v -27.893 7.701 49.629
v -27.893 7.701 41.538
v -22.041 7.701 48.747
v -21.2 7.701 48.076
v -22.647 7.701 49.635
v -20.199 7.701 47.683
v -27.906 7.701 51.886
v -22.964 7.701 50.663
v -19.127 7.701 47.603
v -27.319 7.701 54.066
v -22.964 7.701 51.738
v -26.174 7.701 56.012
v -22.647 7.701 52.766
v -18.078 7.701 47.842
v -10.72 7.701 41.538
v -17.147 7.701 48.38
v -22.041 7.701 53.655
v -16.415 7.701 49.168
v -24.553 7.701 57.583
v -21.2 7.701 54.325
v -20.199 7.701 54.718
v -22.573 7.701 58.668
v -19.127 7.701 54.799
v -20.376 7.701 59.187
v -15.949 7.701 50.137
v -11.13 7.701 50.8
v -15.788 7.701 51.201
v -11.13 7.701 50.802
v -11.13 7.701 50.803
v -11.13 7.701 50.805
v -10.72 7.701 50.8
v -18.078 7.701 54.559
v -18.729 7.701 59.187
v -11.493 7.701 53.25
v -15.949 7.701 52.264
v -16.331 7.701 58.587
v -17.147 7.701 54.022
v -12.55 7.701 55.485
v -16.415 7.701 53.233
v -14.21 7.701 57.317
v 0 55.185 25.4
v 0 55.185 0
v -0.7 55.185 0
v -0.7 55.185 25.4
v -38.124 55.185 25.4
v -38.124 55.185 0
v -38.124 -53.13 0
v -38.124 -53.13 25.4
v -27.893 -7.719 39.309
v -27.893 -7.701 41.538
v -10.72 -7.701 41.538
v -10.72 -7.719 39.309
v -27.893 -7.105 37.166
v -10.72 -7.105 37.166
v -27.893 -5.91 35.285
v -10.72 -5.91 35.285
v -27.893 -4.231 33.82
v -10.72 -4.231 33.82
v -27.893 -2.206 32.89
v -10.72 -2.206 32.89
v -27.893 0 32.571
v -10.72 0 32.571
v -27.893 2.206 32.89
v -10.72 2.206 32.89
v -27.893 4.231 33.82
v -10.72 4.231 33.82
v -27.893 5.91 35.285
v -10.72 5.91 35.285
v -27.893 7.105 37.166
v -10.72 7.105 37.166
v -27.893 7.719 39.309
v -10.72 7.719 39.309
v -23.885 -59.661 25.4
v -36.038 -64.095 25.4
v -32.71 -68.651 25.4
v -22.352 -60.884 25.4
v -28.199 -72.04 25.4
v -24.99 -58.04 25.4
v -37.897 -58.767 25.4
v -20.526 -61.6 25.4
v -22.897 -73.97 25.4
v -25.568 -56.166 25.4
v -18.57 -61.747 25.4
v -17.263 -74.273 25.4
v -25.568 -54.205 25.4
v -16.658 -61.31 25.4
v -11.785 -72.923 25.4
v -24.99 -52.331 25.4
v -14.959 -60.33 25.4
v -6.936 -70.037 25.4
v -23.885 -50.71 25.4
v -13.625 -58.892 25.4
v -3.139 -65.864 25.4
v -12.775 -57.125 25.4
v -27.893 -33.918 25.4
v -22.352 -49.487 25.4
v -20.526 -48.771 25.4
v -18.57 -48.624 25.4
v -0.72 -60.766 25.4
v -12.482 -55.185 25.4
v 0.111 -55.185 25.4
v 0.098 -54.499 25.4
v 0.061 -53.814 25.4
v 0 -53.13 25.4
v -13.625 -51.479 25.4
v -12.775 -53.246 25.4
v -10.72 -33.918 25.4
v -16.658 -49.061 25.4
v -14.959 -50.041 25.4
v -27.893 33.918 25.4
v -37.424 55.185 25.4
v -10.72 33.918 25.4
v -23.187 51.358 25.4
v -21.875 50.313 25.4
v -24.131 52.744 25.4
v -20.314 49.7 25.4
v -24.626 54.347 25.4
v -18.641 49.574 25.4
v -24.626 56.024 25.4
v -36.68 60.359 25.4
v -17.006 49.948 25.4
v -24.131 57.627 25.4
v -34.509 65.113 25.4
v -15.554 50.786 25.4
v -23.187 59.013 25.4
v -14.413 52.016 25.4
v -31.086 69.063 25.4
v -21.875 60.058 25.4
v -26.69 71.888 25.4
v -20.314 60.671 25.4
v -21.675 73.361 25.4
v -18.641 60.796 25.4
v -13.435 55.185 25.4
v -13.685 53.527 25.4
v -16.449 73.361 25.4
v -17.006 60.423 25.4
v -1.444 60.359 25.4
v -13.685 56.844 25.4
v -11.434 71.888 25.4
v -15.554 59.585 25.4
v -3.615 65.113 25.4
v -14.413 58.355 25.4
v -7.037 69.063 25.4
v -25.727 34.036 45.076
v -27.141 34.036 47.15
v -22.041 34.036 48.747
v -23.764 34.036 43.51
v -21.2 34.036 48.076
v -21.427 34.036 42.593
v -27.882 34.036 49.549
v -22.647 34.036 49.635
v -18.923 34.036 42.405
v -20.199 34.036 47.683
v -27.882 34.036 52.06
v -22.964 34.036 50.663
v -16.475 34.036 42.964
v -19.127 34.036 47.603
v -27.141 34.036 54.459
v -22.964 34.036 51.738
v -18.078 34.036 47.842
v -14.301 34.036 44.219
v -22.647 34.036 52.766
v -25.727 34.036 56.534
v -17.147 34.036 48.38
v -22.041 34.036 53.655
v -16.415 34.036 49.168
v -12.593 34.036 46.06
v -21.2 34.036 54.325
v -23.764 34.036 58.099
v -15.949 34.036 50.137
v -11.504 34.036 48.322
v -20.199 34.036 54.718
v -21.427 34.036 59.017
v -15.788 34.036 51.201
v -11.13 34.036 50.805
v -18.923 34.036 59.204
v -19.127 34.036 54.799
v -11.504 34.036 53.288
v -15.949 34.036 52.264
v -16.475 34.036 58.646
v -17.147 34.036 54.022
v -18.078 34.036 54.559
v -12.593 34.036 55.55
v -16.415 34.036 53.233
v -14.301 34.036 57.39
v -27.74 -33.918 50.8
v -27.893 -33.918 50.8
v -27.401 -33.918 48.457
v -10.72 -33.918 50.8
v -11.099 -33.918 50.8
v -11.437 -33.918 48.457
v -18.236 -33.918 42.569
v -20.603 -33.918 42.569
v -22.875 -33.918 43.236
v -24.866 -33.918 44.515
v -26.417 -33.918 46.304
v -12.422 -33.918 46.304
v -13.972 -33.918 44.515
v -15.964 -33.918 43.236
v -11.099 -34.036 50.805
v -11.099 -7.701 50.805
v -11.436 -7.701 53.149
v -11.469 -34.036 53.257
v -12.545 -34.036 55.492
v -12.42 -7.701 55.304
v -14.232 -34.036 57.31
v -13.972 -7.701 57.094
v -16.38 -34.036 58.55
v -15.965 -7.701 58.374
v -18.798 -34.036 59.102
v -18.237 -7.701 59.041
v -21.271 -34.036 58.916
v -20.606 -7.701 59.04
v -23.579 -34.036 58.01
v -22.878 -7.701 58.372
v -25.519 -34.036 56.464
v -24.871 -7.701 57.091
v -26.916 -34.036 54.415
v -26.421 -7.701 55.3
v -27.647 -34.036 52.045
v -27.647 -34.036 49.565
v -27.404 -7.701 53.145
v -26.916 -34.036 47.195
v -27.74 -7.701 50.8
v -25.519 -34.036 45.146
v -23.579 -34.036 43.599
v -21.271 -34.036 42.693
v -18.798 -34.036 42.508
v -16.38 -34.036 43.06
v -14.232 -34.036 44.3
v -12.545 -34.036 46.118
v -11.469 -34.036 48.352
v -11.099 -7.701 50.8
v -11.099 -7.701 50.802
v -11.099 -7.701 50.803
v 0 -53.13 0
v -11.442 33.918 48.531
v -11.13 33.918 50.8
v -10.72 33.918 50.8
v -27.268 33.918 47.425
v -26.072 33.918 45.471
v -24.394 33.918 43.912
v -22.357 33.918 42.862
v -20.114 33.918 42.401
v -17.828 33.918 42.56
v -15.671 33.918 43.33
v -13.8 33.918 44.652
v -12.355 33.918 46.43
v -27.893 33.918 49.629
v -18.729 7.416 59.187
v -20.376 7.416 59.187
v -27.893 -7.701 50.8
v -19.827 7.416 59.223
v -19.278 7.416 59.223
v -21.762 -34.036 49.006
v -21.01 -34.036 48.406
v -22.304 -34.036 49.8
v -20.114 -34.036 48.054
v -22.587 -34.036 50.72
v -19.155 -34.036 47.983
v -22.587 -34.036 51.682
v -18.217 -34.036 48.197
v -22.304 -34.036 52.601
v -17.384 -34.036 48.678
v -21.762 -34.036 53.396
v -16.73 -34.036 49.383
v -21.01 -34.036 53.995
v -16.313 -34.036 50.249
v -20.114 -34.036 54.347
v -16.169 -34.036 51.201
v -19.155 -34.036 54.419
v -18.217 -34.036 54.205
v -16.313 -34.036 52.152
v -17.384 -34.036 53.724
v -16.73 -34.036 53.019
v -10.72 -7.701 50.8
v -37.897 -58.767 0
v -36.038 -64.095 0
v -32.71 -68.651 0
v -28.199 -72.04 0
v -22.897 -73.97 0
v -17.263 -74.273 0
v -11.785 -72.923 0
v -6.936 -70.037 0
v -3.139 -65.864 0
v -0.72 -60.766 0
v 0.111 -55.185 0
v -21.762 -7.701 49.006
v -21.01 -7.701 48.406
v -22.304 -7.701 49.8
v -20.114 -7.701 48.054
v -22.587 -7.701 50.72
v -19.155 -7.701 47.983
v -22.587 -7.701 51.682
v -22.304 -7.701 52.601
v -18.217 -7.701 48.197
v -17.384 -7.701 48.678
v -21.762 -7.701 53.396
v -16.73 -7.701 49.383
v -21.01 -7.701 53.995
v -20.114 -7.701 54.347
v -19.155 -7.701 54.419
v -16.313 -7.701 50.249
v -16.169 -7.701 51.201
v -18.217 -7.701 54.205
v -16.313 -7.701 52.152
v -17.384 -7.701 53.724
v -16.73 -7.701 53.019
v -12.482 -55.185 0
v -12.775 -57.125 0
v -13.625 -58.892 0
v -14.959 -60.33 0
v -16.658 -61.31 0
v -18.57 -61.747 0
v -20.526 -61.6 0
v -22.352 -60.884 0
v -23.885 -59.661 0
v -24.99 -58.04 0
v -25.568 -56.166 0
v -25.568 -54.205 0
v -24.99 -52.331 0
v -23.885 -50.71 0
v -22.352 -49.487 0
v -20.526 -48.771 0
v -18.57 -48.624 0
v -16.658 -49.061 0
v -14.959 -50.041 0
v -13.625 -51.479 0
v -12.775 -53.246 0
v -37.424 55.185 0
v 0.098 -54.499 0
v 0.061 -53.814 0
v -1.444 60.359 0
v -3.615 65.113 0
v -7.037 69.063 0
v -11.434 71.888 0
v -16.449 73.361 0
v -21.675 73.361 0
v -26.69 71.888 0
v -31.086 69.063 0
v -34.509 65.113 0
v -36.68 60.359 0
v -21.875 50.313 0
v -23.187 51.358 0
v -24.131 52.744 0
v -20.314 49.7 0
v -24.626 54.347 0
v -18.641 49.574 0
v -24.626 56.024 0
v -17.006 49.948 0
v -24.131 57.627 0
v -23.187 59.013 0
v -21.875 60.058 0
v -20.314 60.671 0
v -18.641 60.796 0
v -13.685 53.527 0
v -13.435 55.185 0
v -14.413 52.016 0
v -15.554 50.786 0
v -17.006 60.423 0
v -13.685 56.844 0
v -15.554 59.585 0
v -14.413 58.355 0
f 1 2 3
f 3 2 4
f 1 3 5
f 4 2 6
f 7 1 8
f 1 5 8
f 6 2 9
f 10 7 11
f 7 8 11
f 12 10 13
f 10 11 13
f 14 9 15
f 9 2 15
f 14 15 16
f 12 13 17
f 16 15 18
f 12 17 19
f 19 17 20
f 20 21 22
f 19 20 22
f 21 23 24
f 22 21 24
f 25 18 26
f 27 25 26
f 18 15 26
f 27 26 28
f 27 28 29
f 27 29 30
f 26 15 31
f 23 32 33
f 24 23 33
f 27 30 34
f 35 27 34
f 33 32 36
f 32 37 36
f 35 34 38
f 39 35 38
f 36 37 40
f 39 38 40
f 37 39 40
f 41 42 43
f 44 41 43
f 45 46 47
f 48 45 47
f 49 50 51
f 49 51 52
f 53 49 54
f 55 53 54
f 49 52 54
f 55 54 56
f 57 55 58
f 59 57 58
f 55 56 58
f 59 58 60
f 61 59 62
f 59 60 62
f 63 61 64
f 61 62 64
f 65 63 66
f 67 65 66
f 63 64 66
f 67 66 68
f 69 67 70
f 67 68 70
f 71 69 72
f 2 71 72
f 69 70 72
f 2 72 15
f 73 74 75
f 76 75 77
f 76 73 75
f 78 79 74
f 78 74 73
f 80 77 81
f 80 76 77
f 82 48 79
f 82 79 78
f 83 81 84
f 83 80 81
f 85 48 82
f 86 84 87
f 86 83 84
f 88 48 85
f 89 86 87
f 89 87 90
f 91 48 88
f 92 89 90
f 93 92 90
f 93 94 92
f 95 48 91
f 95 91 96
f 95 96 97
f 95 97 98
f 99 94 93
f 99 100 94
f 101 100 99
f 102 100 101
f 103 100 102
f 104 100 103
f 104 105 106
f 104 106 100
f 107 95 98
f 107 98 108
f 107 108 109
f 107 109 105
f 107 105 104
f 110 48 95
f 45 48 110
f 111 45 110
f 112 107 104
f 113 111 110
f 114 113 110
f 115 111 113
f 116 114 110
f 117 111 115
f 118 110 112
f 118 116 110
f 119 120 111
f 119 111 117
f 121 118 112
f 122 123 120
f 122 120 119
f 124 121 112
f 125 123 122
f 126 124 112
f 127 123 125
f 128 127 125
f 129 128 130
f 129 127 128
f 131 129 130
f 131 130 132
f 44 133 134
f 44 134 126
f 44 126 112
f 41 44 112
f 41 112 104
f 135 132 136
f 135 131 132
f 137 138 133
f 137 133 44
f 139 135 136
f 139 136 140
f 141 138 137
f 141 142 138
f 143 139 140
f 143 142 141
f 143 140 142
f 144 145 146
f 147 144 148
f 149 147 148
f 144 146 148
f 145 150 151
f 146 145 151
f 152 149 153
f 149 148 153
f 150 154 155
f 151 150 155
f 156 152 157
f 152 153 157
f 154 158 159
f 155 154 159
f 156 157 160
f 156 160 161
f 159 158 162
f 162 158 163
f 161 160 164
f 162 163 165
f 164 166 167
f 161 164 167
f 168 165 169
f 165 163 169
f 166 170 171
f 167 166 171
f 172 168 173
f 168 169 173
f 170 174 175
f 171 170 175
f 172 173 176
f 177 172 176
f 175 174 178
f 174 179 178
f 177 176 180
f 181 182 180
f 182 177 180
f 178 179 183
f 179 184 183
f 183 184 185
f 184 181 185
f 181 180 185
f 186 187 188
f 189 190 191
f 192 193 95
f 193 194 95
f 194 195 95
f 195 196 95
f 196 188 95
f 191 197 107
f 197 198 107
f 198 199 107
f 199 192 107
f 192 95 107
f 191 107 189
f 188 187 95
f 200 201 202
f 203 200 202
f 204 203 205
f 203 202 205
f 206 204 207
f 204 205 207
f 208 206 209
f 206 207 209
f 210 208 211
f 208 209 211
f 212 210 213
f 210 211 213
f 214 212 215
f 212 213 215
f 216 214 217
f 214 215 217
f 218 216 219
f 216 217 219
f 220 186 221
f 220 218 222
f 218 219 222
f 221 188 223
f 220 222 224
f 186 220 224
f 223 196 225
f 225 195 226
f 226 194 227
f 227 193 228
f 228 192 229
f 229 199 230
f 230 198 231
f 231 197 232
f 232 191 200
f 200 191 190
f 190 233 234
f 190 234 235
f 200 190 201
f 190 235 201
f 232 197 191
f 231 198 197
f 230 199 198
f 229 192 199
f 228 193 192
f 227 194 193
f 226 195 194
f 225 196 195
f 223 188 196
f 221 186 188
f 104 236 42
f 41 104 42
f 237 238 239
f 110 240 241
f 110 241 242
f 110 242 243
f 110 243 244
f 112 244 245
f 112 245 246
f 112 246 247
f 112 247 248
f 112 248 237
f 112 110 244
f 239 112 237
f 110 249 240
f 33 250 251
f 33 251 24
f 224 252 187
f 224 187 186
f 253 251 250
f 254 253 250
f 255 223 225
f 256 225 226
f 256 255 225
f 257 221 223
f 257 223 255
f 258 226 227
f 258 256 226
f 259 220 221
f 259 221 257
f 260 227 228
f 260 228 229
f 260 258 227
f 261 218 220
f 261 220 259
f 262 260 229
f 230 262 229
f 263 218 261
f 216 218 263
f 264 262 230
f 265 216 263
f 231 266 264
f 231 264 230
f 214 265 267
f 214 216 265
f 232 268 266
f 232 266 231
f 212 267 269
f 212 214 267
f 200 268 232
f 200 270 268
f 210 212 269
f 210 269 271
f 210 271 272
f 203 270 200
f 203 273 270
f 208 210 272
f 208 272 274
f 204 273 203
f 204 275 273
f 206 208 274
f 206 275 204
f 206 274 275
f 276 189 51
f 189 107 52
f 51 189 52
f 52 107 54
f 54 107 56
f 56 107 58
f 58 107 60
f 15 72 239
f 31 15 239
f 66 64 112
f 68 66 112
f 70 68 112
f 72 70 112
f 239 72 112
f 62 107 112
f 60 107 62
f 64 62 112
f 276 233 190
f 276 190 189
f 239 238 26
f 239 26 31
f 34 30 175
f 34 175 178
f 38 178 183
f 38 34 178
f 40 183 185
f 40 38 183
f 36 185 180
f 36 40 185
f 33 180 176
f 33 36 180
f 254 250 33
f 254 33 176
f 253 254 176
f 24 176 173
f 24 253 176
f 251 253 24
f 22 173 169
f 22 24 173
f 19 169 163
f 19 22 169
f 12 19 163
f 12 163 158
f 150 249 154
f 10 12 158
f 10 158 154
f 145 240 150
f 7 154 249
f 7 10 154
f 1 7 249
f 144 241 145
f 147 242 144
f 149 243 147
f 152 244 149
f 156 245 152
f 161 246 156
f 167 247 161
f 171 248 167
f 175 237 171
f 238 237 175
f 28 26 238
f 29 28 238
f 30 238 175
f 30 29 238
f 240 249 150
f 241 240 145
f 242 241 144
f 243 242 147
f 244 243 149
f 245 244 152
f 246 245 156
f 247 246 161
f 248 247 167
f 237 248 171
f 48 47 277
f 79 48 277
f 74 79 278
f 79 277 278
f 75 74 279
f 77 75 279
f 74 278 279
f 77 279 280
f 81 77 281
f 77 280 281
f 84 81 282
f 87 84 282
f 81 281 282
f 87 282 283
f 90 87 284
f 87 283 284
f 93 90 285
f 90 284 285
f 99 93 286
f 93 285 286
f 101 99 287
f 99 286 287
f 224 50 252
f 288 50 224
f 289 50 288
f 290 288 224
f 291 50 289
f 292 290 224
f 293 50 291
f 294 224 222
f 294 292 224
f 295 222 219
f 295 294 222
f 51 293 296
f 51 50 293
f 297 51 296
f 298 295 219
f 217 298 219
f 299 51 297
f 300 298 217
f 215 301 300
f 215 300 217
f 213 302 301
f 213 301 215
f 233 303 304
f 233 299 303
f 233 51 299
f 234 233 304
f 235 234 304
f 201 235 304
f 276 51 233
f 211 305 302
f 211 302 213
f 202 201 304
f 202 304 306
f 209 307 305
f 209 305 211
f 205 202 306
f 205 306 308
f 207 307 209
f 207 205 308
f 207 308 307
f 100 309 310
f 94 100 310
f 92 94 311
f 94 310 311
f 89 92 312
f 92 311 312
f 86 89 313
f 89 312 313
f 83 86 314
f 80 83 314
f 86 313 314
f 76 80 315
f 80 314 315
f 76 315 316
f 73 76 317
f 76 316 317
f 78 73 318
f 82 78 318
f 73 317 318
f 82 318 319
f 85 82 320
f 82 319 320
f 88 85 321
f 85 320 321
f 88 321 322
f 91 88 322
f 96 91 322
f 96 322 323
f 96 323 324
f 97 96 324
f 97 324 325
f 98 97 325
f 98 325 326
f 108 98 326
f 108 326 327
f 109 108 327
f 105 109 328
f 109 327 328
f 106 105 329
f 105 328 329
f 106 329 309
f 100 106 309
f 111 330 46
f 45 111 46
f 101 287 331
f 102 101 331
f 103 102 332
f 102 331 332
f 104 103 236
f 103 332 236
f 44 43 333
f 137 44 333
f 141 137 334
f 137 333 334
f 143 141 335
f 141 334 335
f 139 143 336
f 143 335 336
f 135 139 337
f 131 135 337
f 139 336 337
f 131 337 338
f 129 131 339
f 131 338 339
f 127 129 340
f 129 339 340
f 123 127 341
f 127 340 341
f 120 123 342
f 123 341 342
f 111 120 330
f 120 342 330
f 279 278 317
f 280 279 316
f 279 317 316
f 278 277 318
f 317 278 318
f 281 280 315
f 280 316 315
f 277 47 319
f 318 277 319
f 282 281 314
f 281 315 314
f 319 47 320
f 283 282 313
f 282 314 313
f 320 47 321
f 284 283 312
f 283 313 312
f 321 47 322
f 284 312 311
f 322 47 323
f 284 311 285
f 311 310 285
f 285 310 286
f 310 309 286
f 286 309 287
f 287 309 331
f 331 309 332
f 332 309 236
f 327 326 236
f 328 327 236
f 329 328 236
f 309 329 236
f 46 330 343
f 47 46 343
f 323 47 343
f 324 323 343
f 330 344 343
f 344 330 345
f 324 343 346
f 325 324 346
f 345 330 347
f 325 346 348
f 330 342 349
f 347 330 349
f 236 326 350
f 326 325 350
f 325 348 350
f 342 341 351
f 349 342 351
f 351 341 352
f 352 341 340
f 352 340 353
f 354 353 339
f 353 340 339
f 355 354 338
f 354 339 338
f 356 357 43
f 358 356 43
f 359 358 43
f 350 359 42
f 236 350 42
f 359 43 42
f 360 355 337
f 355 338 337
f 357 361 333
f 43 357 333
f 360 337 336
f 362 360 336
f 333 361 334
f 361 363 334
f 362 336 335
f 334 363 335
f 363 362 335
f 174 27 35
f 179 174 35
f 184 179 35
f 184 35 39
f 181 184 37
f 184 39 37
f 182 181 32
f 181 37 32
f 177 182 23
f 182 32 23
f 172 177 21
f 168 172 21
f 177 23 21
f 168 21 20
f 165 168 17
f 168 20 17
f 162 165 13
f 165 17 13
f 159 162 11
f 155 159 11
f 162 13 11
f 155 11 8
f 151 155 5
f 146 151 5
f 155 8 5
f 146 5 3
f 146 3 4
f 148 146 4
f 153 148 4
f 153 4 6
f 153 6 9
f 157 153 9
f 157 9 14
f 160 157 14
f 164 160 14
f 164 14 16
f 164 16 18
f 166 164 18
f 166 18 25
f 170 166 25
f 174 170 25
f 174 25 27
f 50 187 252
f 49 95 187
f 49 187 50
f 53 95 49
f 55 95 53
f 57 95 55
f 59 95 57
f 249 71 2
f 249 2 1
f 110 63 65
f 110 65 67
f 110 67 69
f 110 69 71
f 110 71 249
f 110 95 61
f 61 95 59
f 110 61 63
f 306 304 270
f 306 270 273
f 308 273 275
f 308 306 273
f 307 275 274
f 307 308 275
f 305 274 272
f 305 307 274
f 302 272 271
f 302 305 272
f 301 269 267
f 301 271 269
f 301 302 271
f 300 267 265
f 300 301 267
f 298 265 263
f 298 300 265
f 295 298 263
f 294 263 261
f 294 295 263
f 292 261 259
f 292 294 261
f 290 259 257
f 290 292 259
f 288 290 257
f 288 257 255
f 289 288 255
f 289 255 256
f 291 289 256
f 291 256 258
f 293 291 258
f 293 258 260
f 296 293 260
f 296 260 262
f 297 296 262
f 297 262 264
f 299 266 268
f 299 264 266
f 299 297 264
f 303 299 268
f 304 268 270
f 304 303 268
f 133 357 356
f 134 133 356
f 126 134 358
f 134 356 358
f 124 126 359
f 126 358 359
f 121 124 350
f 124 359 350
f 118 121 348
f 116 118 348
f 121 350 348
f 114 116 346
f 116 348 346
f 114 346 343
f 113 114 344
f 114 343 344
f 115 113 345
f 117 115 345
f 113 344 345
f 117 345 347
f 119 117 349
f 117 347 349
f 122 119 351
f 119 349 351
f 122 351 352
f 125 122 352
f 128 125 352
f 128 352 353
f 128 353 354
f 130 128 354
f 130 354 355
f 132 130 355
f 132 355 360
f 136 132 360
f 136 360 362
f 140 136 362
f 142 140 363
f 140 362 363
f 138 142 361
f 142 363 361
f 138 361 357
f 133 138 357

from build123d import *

# Parameters (mm, degrees)
F1_DEPTH  = 25.4
F2_W      = 17.1734541655
F2_H      = 67.8351446986
F3_DEPTH  = 50.8
F4_R      = 8.3202188196
F5_DEPTH  = 34.036
F6_R      = 8.4229671273
F7_DEPTH  = 34.036
F8_R      = 7.7907761567
F9_DEPTH  = 38.2351304042
F10_W     = 15.4029955156
F10_H     = 18.5406394303
F11_DEPTH = 38.2351304042
F12_W     = 7.4162576348
F12_H     = 9.1277062893
F13_DEPTH = 38.2351304042
F14_R     = 3.6080391768
F15_DEPTH = 73.5484318443
F16_DEPTH = 73.5484318443
F17_R     = 3.2271301898
F18_DEPTH = 36.068


with BuildPart() as f1:
    # F0 (on Top) → F1 (new body)
    with BuildSketch(Plane.XY):
        with BuildLine():
            Line((-13.4350418075, 55.1854707301), (-0.6998389782, 55.1854707301))
            ThreePointArc((-0.6998389782, 55.1854707301), (-19.0618000925, 73.5474318443), (-37.4237612067, 55.1854707301))
            Line((-37.4237612067, 55.1854707301), (-24.6885583774, 55.1854707301))
            ThreePointArc((-24.6885583774, 55.1854707301), (-19.0618000925, 60.812229015), (-13.4350418075, 55.1854707301))
        make_face()
        with BuildLine():
            ThreePointArc((-37.4237612067, 55.1854707301), (-19.0618000925, 36.8235096158), (-0.6998389782, 55.1854707301))
            Line((-0.6998389782, 55.1854707301), (-13.4350418075, 55.1854707301))
            ThreePointArc((-13.4350418075, 55.1854707301), (-19.0618000925, 49.5587124451), (-24.6885583774, 55.1854707301))
            Line((-24.6885583774, 55.1854707301), (-37.4237612067, 55.1854707301))
        make_face()
        with BuildLine():
            ThreePointArc((-38.1236001849, -53.1297404909), (-19.0618000925, -36.0131404184), (0, -53.1297404909))
            Line((0, -53.1297404909), (0, 55.1854707301))
            Line((0, 55.1854707301), (-0.6998389782, 55.1854707301))
            ThreePointArc((-0.6998389782, 55.1854707301), (-19.0618000925, 36.8235096158), (-37.4237612067, 55.1854707301))
            Line((-37.4237612067, 55.1854707301), (-38.1236001849, 55.1854707301))
            Line((-38.1236001849, 55.1854707301), (-38.1236001849, -53.1297404909))
        make_face()
        with BuildLine():
            Line((-12.4822018454, -55.1854707301), (0, -55.1854707301))
            Line((0, -55.1854707301), (0, -53.1297404909))
            ThreePointArc((0, -53.1297404909), (-19.0618000925, -36.0131404184), (-38.1236001849, -53.1297404909))
            Line((-38.1236001849, -53.1297404909), (-38.1236001849, -55.1854707301))
            Line((-38.1236001849, -55.1854707301), (-25.6413983395, -55.1854707301))
            ThreePointArc((-25.6413983395, -55.1854707301), (-19.0618000925, -48.605872483), (-12.4822018454, -55.1854707301))
        make_face()
        with BuildLine():
            Line((0, -53.1297404909), (0, -55.1854707301))
            Line((0, -55.1854707301), (-12.4822018454, -55.1854707301))
            ThreePointArc((-12.4822018454, -55.1854707301), (-19.0618000925, -61.7650689771), (-25.6413983395, -55.1854707301))
            Line((-25.6413983395, -55.1854707301), (-38.1236001849, -55.1854707301))
            Line((-38.1236001849, -55.1854707301), (-38.1236001849, -53.1297404909))
            ThreePointArc((-38.1236001849, -53.1297404909), (-20.0911498563, -74.3301485452), (0.1105302192, -55.1854707301))
            ThreePointArc((0.1105302192, -55.1854707301), (0.0828777227, -54.1561209662), (0, -53.1297404909))
        make_face()
    extrude(amount=F1_DEPTH)

    # F2 (on Top) → F3 (join)
    with BuildSketch(Plane.XY):
        with Locations((-19.3063616753, 0)):
            Rectangle(F2_W, F2_H)
    extrude(amount=F3_DEPTH)

    # F4 (on Front) → F5 (join)
    with BuildSketch(Plane.XZ):
        with Locations((-19.4193646312, 50.8048012853)):
            Circle(F4_R)
    extrude(amount=F5_DEPTH)

    # F6 (on Front) → F7 (join)
    with BuildSketch(Plane.XZ):
        with Locations((-19.5526480675, 50.8048012853)):
            Circle(F6_R)
    extrude(amount=-F7_DEPTH)

    # F8 (on Right) → F9 (cut, through all)
    with BuildSketch(Plane.YZ):
        with Locations((0, 40.3615534306)):
            Circle(F8_R)
    extrude(amount=-F9_DEPTH, mode=Mode.SUBTRACT)

    # F10 (on Right) → F11 (cut, through all)
    with BuildSketch(Plane.YZ):
        with Locations((2.328e-07, 49.9171148986)):
            Rectangle(F10_W, F10_H)
    extrude(amount=-F11_DEPTH, mode=Mode.SUBTRACT)

    # F12 (on Right) → F13 (cut, through all)
    with BuildSketch(Plane.YZ):
        with Locations((3.7081288174, 60.043156147)):
            Rectangle(F12_W, F12_H)
    extrude(amount=-F13_DEPTH, mode=Mode.SUBTRACT)

    # F14 (on Front) → F15 (cut, through all)
    with BuildSketch(Plane.XZ):
        with Locations((-19.3963646889, 51.2006953359)):
            Circle(F14_R)
    extrude(amount=-F15_DEPTH, mode=Mode.SUBTRACT)

    # F14 (on Front) → F16 (cut, through all)
    with BuildSketch(Plane.XZ):
        with Locations((-19.3963646889, 51.2006953359)):
            Circle(F14_R)
    extrude(amount=-F16_DEPTH, mode=Mode.SUBTRACT)

    # F17 (on Front) → F18 (cut)
    with BuildSketch(Plane.XZ):
        with Locations((-19.3963646889, 51.2006953359)):
            Circle(F17_R)
    extrude(amount=F18_DEPTH, mode=Mode.SUBTRACT)


solid = f1.part
